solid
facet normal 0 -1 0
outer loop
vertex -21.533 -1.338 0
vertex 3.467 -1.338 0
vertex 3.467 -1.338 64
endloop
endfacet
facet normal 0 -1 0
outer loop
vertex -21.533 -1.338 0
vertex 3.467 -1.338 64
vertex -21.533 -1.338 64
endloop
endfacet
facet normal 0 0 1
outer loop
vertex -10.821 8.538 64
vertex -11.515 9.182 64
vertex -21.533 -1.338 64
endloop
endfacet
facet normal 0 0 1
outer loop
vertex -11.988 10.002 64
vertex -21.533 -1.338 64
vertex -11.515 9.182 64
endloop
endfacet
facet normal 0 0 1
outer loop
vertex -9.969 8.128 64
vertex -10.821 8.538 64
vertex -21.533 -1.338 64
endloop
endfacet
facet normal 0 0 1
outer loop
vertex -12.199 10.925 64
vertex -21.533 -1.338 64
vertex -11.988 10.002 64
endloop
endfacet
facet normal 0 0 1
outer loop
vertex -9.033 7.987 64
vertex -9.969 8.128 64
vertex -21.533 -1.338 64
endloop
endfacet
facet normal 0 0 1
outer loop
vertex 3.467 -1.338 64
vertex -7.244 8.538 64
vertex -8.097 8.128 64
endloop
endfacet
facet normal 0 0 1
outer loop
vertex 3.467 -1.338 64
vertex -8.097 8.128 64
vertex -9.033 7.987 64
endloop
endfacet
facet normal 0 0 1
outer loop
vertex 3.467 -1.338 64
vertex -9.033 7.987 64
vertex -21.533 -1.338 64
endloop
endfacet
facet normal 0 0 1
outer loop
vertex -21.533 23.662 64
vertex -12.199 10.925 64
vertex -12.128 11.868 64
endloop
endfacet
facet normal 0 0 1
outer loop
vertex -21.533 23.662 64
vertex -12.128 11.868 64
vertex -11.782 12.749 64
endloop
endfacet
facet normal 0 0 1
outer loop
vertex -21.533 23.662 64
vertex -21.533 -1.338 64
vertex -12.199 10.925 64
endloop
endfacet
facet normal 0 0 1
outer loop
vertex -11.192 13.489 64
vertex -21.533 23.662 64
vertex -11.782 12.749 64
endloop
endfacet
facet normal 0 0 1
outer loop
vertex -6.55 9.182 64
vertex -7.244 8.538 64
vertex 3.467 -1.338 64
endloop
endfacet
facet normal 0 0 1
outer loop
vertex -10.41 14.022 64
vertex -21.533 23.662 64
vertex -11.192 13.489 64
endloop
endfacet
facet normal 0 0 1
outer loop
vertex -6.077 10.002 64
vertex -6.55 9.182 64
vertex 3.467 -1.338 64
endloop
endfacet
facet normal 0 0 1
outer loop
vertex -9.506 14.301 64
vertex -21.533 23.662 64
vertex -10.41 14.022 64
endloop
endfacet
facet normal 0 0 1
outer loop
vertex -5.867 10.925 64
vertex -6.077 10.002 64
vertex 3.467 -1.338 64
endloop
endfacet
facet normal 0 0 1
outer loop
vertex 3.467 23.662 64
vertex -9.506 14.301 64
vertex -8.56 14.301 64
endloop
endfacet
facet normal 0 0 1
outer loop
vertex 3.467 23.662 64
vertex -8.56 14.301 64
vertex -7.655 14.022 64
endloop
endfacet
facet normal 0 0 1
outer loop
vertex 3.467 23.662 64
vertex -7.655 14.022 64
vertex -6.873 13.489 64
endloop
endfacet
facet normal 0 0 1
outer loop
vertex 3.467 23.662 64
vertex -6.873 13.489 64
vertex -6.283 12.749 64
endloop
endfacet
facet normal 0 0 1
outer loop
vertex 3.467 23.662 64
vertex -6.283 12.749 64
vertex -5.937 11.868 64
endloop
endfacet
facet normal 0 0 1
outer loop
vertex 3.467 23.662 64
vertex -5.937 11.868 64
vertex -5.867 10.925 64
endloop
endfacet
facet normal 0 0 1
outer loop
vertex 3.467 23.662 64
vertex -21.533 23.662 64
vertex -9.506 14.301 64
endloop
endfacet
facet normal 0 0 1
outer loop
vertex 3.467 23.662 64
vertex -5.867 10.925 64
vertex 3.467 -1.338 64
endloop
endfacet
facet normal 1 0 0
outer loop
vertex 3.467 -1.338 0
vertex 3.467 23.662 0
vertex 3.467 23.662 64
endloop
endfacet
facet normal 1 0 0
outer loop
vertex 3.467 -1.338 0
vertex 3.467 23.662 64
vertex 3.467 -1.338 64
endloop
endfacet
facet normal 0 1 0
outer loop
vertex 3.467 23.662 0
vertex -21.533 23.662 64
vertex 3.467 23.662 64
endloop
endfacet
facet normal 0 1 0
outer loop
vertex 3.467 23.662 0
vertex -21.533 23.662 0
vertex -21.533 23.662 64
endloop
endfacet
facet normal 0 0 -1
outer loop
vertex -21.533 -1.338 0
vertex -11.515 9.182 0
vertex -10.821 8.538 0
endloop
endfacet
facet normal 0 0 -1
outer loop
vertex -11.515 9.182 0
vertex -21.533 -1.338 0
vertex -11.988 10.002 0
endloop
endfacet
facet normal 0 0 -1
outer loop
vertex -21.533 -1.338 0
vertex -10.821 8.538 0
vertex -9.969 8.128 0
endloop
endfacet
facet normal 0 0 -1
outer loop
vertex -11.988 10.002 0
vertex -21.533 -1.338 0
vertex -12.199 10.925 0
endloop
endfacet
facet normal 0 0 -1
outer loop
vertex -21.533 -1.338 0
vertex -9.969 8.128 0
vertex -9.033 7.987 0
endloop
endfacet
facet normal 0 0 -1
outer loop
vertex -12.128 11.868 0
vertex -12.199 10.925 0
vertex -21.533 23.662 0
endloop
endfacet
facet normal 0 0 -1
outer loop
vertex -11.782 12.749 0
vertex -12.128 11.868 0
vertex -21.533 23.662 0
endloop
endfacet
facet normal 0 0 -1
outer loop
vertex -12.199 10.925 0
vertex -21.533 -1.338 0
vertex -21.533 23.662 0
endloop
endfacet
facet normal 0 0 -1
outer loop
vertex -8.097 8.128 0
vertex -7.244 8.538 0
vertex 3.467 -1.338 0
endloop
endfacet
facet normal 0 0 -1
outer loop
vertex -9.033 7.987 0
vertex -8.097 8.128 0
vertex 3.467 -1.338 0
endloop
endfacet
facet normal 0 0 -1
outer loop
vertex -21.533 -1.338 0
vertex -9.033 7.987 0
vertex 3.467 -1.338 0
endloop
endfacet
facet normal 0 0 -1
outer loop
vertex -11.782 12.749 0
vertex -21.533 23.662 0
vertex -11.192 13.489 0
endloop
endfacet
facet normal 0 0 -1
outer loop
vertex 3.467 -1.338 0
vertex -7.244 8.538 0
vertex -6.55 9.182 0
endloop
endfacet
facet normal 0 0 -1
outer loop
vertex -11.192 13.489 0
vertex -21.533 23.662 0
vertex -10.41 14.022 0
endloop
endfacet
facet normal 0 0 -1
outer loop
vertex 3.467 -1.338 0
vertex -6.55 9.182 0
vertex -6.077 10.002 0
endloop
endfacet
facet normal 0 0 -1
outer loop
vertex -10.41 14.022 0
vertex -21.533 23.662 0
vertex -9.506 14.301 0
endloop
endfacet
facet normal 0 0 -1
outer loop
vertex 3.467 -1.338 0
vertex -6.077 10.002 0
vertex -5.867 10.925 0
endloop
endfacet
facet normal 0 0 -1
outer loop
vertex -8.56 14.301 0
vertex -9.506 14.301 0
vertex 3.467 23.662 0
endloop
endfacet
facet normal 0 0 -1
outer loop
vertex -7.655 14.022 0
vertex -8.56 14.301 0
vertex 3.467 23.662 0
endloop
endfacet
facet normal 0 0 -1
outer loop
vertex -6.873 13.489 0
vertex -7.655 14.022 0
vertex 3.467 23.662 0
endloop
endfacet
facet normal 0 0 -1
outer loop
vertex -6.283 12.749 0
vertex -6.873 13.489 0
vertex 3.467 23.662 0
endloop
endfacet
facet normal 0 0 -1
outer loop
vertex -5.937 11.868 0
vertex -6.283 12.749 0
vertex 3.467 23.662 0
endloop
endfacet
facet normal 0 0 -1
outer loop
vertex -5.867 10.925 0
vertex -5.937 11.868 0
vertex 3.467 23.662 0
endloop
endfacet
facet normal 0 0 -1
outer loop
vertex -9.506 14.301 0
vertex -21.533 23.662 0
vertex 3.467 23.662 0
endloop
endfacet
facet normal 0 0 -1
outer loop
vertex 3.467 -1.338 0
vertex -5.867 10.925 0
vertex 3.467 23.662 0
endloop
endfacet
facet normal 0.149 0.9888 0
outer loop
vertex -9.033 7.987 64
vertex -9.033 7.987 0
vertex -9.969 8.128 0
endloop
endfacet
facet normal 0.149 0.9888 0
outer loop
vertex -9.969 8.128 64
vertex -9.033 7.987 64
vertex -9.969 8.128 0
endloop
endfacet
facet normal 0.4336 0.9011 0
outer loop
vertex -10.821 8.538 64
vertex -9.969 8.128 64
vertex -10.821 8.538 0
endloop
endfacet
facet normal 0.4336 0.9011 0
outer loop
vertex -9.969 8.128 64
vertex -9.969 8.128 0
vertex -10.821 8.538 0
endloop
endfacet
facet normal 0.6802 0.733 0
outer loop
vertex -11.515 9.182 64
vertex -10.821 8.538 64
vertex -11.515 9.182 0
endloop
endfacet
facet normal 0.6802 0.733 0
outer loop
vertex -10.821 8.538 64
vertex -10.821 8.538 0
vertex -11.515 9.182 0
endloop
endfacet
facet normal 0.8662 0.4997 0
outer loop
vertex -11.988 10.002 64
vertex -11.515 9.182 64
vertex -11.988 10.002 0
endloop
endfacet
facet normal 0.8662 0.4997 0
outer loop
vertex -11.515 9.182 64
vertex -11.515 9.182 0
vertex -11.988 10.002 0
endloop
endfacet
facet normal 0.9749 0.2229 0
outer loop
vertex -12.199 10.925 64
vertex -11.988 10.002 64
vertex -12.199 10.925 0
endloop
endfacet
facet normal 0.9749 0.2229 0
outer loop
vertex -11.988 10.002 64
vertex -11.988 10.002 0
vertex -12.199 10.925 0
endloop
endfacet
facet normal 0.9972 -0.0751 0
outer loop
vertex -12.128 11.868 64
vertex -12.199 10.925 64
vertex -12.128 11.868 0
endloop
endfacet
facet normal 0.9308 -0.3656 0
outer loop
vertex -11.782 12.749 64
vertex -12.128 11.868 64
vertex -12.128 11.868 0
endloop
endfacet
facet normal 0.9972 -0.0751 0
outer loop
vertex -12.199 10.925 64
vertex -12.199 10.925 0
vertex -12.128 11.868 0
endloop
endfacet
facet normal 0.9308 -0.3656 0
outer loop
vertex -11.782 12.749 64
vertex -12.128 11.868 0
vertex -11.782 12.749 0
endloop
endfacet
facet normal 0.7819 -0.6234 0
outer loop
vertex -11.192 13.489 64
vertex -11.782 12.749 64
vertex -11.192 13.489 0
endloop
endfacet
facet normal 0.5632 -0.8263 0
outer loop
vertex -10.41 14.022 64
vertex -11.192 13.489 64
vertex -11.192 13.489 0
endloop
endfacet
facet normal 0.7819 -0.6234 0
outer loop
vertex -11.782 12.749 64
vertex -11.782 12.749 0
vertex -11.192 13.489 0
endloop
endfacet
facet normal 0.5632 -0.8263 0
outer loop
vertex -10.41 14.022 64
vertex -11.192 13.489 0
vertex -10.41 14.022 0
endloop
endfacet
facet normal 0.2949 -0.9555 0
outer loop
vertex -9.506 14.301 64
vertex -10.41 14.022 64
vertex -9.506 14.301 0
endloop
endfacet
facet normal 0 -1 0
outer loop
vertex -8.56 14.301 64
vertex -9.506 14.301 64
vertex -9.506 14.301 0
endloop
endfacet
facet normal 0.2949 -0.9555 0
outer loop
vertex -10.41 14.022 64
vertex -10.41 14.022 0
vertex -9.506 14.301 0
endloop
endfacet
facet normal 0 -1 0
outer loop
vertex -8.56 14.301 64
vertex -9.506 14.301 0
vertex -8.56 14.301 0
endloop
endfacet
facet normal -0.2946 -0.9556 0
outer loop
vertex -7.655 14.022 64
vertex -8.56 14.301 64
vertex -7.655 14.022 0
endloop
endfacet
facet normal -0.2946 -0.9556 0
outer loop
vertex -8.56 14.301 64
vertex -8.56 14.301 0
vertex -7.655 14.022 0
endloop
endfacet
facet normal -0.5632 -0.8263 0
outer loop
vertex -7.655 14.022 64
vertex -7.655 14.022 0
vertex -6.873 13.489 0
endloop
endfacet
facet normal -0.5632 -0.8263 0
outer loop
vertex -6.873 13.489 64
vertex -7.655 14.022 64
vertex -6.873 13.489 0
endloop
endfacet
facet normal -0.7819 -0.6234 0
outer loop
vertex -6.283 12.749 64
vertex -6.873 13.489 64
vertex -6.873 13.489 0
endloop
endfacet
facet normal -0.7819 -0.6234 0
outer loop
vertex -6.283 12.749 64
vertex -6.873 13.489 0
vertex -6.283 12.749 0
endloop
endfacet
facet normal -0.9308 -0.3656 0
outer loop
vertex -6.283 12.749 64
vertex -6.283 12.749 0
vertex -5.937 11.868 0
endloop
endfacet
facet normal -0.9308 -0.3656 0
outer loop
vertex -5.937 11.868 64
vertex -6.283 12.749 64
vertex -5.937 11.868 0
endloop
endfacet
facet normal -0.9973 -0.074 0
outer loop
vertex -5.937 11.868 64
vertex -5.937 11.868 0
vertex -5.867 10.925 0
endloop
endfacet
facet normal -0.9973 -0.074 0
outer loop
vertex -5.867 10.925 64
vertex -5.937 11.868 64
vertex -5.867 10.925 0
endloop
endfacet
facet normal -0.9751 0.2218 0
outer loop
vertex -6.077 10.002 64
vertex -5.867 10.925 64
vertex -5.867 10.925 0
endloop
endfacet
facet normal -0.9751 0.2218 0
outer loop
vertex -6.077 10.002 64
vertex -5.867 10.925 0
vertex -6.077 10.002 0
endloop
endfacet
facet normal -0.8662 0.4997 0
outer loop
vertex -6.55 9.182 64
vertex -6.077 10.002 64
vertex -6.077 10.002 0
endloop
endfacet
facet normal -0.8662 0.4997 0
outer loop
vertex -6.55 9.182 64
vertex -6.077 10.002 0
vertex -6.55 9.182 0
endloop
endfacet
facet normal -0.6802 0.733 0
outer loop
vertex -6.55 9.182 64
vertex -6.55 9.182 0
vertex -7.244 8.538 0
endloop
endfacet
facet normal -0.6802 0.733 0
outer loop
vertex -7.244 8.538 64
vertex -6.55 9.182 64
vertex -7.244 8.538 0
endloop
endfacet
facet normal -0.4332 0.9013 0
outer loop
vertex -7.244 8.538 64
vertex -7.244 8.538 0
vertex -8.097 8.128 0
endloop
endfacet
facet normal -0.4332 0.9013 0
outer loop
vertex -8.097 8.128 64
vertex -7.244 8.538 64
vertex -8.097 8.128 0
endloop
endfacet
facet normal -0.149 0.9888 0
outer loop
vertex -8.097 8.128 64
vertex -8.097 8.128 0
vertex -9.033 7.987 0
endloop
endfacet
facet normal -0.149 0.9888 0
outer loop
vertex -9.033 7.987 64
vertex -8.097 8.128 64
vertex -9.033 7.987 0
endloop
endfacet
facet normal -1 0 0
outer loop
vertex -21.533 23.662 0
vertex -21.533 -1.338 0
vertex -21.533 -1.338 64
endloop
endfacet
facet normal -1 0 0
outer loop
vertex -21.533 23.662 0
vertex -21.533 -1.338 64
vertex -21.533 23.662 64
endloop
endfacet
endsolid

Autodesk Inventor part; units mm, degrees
ref_plane "YZ Plane" through (0, 0, 0) normal (1, 0, 0) x (0, 1, 0)
ref_plane "XZ Plane" through (0, 0, 0) normal (0, 1, 0) x (-1, 0, 0)
ref_plane "XY Plane" through (0, 0, 0) normal (0, 0, 1) x (1, 0, 0)
sketch "Sketch1" plane through (0, 0, 0) normal (0, 0, 1) x (1, 0, 0)
  line L0 (-21.5328, 23.6618) -> (3.4672, 23.6618)
  line L1 (3.4672, 23.6618) -> (3.4672, -1.3382)
  line L2 (3.4672, -1.3382) -> (-21.5328, -1.3382)
  line L3 (-21.5328, -1.3382) -> (-21.5328, 23.6618)
  dimension "d0" = 25
  dimension "d1" = 25
extrude "Extrusion1" add sketch "Sketch1" along normal blind 64
sketch "Sketch2" plane through (0, 0, 64) normal (0, 0, 1) x (1, 0, 0)
  line L0 (3.4672, 23.6618) -> (3.4672, -1.3382) projected
  line L1 (-21.5328, 23.6618) -> (3.4672, 23.6618) projected
  line L2 (-21.5328, -1.3382) -> (-21.5328, 23.6618) projected
  circle A0 centre (-9.0328, 11.1618) radius 12.5 construction
hole "Hole1" at (-9.0328, 11.1618, 64) at (-9.0328, 11.1618, 64) direction (0, 0, -1) diameter 6.35 end through all
properties part number "parameters"
